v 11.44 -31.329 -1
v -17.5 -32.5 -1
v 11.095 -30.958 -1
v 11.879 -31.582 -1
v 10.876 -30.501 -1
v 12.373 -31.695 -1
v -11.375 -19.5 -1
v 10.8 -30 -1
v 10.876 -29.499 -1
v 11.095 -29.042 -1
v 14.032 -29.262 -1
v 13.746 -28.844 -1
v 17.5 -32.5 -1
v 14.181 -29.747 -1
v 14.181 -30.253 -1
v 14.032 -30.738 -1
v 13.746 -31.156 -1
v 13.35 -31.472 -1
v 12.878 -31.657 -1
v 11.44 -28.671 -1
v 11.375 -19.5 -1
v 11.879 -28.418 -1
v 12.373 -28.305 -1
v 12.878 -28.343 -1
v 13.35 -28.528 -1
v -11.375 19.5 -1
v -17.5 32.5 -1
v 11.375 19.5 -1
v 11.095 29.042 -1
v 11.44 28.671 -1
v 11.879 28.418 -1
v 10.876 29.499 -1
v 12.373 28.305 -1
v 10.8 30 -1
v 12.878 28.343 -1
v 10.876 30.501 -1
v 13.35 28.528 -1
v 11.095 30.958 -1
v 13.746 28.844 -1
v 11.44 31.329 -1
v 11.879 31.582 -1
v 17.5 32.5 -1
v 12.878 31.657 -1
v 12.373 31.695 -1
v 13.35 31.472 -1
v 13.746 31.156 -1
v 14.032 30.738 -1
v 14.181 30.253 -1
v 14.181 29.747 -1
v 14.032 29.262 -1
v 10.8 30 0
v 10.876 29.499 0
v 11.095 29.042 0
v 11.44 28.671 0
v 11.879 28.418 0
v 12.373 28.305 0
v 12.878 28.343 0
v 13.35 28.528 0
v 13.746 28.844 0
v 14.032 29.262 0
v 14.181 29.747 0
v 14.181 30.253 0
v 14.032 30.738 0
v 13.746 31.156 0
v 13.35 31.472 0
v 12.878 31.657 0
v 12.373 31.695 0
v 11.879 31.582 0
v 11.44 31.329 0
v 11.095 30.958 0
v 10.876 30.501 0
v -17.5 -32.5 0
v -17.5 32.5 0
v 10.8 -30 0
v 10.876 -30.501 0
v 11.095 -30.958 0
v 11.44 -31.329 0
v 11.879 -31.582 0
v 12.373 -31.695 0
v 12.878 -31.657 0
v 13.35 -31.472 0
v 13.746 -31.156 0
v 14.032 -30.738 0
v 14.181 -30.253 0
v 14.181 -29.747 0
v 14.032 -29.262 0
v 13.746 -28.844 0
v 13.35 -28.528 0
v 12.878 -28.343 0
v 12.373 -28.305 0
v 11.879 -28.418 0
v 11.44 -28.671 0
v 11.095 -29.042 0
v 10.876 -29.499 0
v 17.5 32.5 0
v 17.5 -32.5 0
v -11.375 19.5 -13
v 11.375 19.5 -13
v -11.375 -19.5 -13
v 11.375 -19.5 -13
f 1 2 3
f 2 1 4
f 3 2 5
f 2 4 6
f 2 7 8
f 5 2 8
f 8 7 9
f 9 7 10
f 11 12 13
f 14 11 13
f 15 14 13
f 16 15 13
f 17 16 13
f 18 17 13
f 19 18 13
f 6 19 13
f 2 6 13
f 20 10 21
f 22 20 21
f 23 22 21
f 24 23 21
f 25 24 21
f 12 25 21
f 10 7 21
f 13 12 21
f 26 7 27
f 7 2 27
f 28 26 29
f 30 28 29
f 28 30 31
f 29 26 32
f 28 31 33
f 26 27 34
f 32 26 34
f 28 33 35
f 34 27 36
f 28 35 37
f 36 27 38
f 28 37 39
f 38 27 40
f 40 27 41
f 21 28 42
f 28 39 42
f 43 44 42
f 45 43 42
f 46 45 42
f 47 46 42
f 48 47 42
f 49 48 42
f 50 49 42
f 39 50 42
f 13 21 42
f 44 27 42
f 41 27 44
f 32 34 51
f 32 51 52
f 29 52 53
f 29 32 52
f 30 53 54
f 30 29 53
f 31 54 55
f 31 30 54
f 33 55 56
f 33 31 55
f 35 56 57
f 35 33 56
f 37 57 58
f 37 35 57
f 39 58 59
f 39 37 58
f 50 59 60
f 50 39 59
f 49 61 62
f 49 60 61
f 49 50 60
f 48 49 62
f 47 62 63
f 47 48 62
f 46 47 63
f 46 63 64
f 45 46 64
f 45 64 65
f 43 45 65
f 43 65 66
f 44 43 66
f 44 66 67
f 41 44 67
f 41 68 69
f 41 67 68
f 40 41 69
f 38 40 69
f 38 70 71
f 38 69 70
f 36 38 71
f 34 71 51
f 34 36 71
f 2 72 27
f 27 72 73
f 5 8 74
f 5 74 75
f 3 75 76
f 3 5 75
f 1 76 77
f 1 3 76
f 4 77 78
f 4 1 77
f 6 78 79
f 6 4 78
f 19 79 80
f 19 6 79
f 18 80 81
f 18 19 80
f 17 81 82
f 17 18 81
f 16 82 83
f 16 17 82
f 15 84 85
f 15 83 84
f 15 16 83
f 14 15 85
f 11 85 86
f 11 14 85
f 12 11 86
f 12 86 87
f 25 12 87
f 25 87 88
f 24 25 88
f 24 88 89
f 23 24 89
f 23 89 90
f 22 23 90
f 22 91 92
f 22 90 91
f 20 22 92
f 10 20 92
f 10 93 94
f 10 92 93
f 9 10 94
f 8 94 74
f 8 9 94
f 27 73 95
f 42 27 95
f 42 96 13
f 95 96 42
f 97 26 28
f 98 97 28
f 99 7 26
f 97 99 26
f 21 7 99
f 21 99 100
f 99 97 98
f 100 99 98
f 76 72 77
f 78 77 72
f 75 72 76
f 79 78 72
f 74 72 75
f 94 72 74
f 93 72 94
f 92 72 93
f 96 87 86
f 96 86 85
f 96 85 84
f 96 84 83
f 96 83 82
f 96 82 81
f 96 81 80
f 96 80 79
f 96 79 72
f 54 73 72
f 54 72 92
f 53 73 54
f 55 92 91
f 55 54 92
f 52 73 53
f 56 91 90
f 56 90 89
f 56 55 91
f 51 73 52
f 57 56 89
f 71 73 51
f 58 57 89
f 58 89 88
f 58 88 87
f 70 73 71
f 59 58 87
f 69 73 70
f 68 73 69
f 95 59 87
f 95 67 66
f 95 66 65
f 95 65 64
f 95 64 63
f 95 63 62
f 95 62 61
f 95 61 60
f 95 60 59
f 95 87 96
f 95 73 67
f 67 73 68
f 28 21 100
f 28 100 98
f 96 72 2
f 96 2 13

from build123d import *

# Parameters (mm, degrees)
SKETCH1_W                           = 35
SKETCH1_H                           = 65
BOSS_EXTRUDE1_DEPTH                 = 1
SKETCH2_W                           = 22.75
SKETCH2_H                           = 39
BOSS_EXTRUDE2_DEPTH                 = 13
HAI_LO_M3_TRUNG_TRU_TREO_DEPTH      = 40.134383859
HAI_LO_M3_TRUNG_TRU_TREO_DEPTH_BACK = 40.134383859
SKETCH4_R                           = 1.7


with BuildPart() as part:
    # Sketch1 → Boss-Extrude1 (new body)
    with BuildSketch(Plane.XY):
        Rectangle(SKETCH1_W, SKETCH1_H)
    extrude(amount=-BOSS_EXTRUDE1_DEPTH)

    # Sketch2 → Boss-Extrude2 (add)
    with BuildSketch(Plane.XY):
        Rectangle(SKETCH2_W, SKETCH2_H)
    extrude(amount=-BOSS_EXTRUDE2_DEPTH)

    # Sketch4 → Hai_lo_M3_trung_tru_treo (cut, two sides: drawn at the far end of the back side and taken through both)
    with BuildSketch(Plane.XY.offset(-HAI_LO_M3_TRUNG_TRU_TREO_DEPTH_BACK)):
        with Locations(Location((12.5, -30, 0), (0, 0, 180))):
            Circle(SKETCH4_R)
        with Locations(Location((12.5, 30, 0), (0, 0, 180))):
            Circle(SKETCH4_R)
    extrude(amount=HAI_LO_M3_TRUNG_TRU_TREO_DEPTH + HAI_LO_M3_TRUNG_TRU_TREO_DEPTH_BACK, mode=Mode.SUBTRACT)


solid = part.part
